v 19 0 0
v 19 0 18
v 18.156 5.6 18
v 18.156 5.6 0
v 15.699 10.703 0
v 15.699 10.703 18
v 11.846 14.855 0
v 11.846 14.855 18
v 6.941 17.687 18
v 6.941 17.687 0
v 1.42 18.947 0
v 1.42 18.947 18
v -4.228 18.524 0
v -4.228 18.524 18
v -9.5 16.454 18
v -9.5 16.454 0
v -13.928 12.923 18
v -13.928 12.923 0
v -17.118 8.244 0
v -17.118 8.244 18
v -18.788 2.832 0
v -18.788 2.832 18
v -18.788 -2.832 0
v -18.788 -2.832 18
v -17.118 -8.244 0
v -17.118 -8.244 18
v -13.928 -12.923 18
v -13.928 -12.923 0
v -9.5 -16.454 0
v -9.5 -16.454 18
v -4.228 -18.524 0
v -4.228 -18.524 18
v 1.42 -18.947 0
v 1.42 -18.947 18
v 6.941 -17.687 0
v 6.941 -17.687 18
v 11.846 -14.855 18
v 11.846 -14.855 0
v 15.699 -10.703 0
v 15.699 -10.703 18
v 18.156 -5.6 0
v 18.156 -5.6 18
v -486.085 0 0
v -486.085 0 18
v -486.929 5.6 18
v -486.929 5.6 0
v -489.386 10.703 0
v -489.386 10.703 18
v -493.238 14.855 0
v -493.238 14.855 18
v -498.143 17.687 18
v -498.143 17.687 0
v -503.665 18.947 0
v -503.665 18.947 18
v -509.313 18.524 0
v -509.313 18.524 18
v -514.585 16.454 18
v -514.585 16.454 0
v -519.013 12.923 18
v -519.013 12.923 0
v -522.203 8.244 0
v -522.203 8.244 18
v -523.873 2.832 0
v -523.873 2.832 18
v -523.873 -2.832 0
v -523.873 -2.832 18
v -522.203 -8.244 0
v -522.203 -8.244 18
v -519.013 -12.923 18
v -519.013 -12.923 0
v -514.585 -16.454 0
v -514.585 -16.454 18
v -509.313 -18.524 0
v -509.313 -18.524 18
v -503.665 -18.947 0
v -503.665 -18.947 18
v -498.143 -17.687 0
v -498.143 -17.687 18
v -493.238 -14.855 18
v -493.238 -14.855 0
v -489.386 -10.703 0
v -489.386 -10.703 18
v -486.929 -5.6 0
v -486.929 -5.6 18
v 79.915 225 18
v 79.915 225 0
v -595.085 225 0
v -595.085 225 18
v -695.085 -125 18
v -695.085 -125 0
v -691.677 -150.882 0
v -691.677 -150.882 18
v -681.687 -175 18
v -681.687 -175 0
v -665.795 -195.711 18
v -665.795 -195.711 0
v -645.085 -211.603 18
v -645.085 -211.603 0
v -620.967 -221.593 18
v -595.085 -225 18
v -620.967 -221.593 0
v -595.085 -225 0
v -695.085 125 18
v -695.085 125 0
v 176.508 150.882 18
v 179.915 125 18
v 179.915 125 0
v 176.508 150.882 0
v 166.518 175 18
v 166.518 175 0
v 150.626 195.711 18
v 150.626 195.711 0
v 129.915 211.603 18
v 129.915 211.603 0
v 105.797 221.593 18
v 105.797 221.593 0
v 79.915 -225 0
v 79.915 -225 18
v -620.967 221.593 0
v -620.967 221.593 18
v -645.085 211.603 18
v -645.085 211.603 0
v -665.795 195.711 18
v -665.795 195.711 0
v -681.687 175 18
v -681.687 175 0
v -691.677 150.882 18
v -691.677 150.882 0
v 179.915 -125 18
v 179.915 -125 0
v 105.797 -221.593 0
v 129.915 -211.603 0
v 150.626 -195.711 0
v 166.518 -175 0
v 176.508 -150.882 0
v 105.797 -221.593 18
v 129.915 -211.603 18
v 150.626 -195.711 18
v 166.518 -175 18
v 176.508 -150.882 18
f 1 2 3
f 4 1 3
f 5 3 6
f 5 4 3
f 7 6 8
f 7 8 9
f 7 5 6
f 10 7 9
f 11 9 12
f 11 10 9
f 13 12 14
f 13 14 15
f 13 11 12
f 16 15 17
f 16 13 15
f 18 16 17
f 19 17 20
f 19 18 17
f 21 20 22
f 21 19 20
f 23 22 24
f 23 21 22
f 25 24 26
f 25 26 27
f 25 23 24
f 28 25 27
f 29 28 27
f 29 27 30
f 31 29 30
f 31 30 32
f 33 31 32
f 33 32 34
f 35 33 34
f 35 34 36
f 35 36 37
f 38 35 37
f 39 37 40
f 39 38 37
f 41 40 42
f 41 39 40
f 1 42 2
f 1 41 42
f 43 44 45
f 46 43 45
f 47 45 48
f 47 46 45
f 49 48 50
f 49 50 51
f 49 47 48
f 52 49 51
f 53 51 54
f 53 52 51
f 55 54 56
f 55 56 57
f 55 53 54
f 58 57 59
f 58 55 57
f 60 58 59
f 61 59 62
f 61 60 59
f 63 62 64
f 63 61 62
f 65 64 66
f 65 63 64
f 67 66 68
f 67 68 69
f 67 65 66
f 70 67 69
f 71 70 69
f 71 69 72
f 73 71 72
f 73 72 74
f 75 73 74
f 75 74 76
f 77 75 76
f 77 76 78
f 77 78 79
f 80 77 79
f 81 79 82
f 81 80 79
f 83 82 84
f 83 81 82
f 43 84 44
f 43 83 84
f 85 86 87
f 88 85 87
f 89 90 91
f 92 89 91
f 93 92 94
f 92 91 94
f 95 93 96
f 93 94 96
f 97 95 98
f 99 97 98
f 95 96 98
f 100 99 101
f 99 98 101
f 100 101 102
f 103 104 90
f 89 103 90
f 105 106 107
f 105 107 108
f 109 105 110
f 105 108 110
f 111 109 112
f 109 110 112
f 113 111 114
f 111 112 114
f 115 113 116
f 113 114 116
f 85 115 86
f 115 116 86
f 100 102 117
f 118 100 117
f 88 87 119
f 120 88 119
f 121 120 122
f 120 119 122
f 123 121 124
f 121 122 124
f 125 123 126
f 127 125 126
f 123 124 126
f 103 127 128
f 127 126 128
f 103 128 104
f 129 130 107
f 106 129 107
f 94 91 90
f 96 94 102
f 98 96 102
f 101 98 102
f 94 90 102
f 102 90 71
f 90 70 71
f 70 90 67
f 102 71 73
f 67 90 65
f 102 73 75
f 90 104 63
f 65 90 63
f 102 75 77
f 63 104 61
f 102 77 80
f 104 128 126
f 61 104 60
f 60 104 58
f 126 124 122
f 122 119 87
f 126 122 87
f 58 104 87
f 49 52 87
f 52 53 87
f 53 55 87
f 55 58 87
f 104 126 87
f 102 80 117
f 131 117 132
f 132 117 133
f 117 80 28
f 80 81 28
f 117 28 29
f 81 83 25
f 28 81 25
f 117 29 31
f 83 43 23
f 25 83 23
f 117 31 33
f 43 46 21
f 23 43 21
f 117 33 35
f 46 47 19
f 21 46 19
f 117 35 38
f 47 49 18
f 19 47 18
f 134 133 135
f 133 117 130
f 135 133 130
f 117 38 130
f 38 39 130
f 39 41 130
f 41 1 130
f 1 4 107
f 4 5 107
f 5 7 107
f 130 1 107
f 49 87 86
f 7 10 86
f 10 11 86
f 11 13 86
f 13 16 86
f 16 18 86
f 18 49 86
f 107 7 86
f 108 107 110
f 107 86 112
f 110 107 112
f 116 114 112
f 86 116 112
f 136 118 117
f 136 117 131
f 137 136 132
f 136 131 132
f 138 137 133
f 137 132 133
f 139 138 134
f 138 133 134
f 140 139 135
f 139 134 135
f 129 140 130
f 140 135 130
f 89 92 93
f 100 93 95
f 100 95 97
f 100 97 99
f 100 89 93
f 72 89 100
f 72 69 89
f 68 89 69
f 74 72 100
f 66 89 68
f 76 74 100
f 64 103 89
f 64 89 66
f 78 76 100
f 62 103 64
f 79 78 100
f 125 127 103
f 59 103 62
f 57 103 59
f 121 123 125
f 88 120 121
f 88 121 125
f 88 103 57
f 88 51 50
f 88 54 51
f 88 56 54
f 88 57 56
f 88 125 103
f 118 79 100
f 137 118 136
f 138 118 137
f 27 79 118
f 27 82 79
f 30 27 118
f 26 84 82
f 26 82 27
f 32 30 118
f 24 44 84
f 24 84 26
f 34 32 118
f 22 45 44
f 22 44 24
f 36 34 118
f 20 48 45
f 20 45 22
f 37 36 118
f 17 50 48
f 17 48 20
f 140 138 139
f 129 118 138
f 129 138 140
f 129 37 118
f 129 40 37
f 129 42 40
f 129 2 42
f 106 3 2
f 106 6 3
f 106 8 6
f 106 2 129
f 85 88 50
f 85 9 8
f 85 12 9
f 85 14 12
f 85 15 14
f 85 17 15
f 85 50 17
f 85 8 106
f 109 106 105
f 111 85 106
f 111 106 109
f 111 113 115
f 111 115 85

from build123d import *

# Parameters (mm, degrees)
F0_R     = 19
F1_DEPTH = 18


with BuildPart() as f1:
    # F0 (on Top) → F1 (new body)
    with BuildSketch(Plane.XY):
        with BuildLine():
            Line((79.915271, 225), (-595.084729, 225))
            ThreePointArc((-595.084729, 225), (-665.795407, 195.710678), (-695.084729, 125))
            Line((-695.084729, 125), (-695.084729, -125))
            ThreePointArc((-695.084729, -125), (-665.795407, -195.710678), (-595.084729, -225))
            Line((-595.084729, -225), (79.915271, -225))
            ThreePointArc((79.915271, -225), (150.625949, -195.710678), (179.915271, -125))
            Line((179.915271, -125), (179.915271, 125))
            ThreePointArc((179.915271, 125), (150.625949, 195.710678), (79.915271, 225))
        make_face()
        with Locations((-505.084729, 0)):
            Circle(F0_R, mode=Mode.SUBTRACT)
        Circle(F0_R, mode=Mode.SUBTRACT)
    extrude(amount=F1_DEPTH)


solid = f1.part
